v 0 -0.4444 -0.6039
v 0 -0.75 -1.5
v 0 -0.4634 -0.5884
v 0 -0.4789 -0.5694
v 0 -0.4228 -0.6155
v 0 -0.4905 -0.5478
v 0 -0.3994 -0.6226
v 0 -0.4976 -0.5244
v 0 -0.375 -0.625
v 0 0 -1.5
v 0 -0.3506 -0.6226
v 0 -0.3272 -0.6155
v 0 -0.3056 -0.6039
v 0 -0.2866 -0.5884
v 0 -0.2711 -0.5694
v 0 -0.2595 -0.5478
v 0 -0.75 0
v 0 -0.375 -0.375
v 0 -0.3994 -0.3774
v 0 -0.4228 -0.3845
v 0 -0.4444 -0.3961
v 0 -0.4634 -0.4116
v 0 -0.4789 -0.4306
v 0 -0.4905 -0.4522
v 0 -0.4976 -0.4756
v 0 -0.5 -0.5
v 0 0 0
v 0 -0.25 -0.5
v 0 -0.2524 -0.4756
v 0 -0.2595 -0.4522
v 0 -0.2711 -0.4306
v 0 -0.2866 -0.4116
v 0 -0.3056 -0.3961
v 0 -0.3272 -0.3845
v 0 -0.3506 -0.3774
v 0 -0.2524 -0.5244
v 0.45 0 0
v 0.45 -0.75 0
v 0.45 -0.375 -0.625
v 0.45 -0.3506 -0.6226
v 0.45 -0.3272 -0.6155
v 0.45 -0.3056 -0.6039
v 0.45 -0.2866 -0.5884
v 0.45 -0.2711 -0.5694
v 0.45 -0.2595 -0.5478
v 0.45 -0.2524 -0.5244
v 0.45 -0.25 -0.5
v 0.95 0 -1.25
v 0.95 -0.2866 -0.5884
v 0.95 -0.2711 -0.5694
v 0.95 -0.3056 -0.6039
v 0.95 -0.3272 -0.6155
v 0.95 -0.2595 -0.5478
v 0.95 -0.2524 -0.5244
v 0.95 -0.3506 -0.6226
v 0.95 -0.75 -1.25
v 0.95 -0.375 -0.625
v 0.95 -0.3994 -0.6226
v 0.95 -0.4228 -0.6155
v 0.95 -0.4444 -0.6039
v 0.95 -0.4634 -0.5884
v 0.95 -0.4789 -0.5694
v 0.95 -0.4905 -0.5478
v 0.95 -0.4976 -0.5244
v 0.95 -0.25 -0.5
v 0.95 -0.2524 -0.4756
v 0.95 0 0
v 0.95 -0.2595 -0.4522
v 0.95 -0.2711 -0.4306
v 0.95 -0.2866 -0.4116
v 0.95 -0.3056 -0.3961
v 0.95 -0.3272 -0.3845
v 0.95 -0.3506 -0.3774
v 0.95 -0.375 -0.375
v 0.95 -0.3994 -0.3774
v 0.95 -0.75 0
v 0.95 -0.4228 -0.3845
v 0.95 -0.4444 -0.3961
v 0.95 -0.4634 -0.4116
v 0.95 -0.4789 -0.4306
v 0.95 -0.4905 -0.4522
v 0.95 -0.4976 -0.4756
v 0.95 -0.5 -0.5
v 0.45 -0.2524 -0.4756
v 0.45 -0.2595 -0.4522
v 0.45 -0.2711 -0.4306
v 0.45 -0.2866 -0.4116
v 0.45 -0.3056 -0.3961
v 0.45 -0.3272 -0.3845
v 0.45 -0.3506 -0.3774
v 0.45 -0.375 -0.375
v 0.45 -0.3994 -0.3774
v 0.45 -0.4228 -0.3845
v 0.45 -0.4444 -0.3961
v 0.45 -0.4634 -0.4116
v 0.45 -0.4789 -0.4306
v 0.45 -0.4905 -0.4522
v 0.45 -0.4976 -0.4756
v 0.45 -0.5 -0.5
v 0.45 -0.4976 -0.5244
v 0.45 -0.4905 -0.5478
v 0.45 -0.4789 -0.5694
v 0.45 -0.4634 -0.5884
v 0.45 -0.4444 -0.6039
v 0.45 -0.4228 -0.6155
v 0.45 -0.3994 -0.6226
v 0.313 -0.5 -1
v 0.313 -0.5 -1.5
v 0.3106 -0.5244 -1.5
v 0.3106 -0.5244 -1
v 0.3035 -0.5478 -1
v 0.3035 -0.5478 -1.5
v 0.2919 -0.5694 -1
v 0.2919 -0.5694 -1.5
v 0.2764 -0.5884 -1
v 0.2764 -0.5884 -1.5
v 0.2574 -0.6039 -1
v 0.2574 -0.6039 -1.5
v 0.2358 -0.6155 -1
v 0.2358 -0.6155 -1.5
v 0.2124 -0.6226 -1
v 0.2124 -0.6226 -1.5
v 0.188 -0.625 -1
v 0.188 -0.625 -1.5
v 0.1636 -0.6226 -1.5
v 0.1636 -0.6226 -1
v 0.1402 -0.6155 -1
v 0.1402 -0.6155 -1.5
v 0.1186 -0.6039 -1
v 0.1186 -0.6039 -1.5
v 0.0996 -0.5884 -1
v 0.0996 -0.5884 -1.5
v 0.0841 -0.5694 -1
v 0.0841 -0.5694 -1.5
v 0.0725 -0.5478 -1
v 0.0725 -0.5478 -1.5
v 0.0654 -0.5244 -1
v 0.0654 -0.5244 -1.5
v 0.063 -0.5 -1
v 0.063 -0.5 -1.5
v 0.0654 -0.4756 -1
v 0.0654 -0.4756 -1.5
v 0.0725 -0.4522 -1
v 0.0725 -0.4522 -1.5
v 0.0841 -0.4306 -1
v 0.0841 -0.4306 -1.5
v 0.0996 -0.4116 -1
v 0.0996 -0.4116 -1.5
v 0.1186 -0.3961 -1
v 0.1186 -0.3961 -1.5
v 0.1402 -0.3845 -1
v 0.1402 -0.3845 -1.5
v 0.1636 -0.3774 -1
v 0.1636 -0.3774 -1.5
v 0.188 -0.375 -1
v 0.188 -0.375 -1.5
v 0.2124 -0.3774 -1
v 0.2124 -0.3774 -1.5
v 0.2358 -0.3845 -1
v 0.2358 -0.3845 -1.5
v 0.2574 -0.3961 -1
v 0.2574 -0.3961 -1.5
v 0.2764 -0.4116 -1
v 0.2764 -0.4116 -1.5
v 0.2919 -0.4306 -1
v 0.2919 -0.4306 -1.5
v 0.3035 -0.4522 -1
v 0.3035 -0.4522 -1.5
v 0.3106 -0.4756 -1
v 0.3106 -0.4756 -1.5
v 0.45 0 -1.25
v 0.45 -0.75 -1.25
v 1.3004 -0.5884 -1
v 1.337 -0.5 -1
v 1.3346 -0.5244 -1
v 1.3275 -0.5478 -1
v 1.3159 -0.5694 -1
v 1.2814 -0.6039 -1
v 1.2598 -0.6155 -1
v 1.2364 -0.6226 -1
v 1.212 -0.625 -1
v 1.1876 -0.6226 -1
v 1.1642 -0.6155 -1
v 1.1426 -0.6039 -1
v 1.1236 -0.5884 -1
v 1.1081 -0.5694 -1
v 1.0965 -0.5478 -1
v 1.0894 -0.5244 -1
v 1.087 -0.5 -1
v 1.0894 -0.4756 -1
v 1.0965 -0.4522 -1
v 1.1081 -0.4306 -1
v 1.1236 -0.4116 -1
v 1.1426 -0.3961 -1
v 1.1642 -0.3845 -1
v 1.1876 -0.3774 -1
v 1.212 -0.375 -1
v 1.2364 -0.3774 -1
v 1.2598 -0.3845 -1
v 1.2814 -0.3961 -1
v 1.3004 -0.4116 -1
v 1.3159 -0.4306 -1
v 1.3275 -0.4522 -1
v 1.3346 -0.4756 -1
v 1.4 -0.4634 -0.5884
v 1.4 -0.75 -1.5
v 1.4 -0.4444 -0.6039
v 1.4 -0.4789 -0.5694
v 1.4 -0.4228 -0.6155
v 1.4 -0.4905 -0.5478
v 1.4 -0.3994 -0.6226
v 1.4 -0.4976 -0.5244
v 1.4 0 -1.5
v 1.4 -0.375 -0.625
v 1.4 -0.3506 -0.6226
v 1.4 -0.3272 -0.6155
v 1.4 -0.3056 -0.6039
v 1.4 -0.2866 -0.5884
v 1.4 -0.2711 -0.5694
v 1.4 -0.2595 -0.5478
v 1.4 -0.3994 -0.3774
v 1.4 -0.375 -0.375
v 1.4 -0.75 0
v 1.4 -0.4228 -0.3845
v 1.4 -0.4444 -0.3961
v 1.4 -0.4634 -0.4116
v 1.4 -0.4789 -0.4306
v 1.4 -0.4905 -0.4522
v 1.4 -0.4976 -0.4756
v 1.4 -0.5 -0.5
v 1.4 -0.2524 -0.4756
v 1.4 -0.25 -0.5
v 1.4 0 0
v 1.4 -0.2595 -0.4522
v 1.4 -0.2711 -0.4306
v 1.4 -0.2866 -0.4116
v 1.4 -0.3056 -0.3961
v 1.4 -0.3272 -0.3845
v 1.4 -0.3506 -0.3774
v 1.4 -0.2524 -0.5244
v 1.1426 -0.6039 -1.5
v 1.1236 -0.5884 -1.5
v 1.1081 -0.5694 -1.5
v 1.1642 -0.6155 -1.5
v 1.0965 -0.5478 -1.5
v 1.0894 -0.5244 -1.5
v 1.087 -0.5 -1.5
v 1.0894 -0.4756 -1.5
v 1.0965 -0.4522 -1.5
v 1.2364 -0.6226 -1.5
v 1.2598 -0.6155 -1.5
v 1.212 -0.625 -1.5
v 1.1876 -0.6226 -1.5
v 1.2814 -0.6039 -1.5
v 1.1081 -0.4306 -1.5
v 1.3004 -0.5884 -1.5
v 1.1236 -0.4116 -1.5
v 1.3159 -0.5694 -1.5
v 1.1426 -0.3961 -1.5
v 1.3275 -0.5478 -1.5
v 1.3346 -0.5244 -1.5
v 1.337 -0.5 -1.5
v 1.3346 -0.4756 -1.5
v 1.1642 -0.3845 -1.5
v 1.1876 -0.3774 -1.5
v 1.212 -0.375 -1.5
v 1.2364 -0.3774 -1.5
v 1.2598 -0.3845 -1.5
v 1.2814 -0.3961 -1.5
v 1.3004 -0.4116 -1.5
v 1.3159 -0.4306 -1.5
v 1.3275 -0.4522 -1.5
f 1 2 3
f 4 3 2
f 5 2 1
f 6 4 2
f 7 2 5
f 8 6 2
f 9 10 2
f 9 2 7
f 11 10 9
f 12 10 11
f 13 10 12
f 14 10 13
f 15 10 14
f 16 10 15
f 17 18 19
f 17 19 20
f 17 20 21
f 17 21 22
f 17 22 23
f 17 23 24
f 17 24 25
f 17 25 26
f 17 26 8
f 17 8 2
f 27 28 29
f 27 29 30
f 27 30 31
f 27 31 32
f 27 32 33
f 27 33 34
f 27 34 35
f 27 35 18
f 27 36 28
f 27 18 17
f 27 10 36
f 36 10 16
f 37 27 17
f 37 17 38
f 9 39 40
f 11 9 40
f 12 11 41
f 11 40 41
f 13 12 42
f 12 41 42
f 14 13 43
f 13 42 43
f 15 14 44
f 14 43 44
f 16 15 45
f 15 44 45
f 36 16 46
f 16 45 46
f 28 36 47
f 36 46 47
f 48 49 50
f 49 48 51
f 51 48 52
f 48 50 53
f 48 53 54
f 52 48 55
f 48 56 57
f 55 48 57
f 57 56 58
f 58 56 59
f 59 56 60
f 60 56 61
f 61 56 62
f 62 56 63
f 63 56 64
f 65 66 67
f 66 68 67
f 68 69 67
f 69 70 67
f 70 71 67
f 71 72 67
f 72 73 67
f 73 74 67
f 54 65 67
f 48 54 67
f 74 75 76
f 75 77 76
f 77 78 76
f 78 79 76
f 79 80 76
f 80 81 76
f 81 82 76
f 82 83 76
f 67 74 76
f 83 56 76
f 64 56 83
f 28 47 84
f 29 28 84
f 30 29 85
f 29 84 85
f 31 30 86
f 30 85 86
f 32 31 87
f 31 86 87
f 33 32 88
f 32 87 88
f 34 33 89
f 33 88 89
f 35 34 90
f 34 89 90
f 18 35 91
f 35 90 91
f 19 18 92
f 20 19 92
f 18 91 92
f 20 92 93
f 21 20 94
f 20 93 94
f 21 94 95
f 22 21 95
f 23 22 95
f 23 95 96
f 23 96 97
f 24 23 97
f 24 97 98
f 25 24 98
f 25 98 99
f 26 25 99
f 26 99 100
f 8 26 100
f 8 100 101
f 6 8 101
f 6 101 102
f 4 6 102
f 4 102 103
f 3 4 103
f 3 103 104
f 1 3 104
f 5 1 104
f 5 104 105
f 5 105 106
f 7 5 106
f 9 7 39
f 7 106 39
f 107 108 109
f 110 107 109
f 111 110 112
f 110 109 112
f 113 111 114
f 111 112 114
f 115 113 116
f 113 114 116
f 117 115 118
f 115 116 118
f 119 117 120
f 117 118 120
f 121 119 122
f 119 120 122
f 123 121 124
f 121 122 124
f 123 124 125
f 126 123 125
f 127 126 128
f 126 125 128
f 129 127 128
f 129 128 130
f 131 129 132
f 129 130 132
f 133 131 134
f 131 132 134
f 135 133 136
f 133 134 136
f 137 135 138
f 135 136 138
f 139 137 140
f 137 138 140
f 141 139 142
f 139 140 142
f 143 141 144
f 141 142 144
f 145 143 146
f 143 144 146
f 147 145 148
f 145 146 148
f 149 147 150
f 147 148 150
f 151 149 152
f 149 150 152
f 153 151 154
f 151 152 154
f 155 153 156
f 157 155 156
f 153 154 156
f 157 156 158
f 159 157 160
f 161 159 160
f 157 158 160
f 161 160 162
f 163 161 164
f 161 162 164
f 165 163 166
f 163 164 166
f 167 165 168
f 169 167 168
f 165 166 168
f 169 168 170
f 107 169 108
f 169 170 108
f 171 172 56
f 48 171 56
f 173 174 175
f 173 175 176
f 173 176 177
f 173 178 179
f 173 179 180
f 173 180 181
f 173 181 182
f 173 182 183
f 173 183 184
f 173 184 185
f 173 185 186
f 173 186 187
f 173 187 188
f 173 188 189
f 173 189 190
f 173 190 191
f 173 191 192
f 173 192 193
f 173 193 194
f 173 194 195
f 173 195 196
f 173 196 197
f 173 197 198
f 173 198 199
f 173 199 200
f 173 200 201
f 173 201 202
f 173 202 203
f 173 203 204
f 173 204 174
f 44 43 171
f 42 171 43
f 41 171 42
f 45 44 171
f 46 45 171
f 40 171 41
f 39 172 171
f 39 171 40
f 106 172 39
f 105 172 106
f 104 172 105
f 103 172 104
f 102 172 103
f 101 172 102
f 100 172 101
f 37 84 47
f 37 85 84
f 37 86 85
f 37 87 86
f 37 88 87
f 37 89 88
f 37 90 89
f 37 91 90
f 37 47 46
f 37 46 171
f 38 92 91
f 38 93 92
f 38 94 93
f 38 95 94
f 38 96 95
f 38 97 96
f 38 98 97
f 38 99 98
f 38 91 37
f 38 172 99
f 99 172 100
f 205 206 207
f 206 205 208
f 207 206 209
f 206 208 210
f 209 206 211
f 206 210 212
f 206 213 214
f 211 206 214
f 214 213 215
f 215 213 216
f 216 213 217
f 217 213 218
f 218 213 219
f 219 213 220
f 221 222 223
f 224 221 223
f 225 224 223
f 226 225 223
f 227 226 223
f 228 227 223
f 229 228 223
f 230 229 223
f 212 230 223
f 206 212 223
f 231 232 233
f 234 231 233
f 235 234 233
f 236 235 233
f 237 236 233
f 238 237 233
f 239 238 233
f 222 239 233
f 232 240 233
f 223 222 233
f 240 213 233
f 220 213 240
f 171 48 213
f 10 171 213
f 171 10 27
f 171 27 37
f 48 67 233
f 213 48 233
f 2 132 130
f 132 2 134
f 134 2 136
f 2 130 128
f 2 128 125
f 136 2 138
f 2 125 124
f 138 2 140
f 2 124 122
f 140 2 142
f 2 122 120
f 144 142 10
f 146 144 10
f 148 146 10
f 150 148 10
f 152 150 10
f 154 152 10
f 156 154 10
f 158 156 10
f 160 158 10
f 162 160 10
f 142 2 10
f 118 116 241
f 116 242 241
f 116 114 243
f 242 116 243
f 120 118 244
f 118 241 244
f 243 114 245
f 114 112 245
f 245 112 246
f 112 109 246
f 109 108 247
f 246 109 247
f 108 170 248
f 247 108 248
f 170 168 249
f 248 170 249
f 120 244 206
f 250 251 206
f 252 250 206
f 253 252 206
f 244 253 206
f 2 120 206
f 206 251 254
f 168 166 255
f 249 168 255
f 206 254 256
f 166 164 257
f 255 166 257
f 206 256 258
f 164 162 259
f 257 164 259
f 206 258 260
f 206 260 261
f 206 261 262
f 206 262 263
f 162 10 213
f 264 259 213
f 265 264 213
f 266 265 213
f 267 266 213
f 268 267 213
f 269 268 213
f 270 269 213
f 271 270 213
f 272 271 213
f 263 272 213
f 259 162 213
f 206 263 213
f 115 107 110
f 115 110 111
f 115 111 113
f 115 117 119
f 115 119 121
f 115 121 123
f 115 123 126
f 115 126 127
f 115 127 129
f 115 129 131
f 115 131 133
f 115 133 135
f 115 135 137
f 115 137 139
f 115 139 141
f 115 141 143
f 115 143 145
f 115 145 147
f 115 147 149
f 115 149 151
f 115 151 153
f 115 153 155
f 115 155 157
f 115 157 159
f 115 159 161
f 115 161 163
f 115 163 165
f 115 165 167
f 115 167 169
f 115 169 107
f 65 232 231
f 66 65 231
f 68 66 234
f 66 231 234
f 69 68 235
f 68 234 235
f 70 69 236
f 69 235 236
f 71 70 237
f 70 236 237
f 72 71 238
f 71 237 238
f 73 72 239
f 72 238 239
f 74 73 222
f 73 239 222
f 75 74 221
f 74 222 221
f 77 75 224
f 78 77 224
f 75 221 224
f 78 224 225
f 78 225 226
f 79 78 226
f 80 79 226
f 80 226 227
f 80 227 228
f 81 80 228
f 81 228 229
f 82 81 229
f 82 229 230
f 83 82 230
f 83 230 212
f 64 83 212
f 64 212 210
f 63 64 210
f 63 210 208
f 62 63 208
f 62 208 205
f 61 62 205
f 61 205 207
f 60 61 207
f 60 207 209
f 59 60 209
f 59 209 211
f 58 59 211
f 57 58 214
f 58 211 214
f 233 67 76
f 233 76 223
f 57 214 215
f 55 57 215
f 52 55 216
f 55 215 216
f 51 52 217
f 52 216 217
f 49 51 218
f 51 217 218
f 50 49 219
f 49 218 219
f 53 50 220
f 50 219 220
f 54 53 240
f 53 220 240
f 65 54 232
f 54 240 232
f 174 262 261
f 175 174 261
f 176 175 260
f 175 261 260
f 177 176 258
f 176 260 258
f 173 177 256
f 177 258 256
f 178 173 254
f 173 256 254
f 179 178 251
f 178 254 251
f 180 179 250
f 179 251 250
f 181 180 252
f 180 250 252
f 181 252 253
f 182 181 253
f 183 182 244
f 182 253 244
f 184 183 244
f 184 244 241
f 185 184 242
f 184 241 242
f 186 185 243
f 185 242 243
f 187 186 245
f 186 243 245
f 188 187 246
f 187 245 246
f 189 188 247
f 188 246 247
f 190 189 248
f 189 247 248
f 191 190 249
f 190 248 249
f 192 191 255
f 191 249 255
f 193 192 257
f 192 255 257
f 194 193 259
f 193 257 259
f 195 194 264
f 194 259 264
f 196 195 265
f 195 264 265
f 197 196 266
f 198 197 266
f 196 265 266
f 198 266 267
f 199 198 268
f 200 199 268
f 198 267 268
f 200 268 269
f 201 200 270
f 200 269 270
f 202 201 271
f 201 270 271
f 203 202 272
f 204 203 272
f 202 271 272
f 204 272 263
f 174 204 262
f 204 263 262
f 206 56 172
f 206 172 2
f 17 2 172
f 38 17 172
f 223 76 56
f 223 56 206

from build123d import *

# Parameters (mm, degrees)
F0_W     = 1.4
F0_H     = 1.5
F1_DEPTH = 0.75
F3_DEPTH = 25
F4_W     = 0.5
F4_H     = 1.25
F5_DEPTH = 25
F6_R     = 0.125
F7_DEPTH = 0.5


with BuildPart() as f1:
    # F0 (on Front) → F1 (new body)
    with BuildSketch(Plane.XZ):
        with Locations((0.7, -0.75)):
            Rectangle(F0_W, F0_H)
    extrude(amount=F1_DEPTH)

    # F2 (on face) → F3 (cut)
    with BuildSketch(Plane.YZ.offset(1.4)):
        with BuildLine():
            ThreePointArc((-0.375, -0.625), (-0.286612, -0.588388), (-0.25, -0.5))
            ThreePointArc((-0.25, -0.5), (-0.463388, -0.411612), (-0.375, -0.625))
        make_face()
    extrude(amount=-F3_DEPTH, mode=Mode.SUBTRACT)

    # F4 (on face) → F5 (cut)
    with BuildSketch(Plane.XZ.offset(0.75)):
        with Locations((0.7, -0.625)):
            Rectangle(F4_W, F4_H)
    extrude(amount=-F5_DEPTH, mode=Mode.SUBTRACT)

    # F6 (on face) → F7 (cut)
    with BuildSketch(Plane(origin=(0, 0, -1.5), x_dir=(1, 0, 0), z_dir=(0, 0, -1))):
        with Locations((0.188, 0.5)):
            Circle(F6_R)
        with Locations((1.212, 0.5)):
            Circle(F6_R)
    extrude(amount=-F7_DEPTH, mode=Mode.SUBTRACT)


solid = f1.part
